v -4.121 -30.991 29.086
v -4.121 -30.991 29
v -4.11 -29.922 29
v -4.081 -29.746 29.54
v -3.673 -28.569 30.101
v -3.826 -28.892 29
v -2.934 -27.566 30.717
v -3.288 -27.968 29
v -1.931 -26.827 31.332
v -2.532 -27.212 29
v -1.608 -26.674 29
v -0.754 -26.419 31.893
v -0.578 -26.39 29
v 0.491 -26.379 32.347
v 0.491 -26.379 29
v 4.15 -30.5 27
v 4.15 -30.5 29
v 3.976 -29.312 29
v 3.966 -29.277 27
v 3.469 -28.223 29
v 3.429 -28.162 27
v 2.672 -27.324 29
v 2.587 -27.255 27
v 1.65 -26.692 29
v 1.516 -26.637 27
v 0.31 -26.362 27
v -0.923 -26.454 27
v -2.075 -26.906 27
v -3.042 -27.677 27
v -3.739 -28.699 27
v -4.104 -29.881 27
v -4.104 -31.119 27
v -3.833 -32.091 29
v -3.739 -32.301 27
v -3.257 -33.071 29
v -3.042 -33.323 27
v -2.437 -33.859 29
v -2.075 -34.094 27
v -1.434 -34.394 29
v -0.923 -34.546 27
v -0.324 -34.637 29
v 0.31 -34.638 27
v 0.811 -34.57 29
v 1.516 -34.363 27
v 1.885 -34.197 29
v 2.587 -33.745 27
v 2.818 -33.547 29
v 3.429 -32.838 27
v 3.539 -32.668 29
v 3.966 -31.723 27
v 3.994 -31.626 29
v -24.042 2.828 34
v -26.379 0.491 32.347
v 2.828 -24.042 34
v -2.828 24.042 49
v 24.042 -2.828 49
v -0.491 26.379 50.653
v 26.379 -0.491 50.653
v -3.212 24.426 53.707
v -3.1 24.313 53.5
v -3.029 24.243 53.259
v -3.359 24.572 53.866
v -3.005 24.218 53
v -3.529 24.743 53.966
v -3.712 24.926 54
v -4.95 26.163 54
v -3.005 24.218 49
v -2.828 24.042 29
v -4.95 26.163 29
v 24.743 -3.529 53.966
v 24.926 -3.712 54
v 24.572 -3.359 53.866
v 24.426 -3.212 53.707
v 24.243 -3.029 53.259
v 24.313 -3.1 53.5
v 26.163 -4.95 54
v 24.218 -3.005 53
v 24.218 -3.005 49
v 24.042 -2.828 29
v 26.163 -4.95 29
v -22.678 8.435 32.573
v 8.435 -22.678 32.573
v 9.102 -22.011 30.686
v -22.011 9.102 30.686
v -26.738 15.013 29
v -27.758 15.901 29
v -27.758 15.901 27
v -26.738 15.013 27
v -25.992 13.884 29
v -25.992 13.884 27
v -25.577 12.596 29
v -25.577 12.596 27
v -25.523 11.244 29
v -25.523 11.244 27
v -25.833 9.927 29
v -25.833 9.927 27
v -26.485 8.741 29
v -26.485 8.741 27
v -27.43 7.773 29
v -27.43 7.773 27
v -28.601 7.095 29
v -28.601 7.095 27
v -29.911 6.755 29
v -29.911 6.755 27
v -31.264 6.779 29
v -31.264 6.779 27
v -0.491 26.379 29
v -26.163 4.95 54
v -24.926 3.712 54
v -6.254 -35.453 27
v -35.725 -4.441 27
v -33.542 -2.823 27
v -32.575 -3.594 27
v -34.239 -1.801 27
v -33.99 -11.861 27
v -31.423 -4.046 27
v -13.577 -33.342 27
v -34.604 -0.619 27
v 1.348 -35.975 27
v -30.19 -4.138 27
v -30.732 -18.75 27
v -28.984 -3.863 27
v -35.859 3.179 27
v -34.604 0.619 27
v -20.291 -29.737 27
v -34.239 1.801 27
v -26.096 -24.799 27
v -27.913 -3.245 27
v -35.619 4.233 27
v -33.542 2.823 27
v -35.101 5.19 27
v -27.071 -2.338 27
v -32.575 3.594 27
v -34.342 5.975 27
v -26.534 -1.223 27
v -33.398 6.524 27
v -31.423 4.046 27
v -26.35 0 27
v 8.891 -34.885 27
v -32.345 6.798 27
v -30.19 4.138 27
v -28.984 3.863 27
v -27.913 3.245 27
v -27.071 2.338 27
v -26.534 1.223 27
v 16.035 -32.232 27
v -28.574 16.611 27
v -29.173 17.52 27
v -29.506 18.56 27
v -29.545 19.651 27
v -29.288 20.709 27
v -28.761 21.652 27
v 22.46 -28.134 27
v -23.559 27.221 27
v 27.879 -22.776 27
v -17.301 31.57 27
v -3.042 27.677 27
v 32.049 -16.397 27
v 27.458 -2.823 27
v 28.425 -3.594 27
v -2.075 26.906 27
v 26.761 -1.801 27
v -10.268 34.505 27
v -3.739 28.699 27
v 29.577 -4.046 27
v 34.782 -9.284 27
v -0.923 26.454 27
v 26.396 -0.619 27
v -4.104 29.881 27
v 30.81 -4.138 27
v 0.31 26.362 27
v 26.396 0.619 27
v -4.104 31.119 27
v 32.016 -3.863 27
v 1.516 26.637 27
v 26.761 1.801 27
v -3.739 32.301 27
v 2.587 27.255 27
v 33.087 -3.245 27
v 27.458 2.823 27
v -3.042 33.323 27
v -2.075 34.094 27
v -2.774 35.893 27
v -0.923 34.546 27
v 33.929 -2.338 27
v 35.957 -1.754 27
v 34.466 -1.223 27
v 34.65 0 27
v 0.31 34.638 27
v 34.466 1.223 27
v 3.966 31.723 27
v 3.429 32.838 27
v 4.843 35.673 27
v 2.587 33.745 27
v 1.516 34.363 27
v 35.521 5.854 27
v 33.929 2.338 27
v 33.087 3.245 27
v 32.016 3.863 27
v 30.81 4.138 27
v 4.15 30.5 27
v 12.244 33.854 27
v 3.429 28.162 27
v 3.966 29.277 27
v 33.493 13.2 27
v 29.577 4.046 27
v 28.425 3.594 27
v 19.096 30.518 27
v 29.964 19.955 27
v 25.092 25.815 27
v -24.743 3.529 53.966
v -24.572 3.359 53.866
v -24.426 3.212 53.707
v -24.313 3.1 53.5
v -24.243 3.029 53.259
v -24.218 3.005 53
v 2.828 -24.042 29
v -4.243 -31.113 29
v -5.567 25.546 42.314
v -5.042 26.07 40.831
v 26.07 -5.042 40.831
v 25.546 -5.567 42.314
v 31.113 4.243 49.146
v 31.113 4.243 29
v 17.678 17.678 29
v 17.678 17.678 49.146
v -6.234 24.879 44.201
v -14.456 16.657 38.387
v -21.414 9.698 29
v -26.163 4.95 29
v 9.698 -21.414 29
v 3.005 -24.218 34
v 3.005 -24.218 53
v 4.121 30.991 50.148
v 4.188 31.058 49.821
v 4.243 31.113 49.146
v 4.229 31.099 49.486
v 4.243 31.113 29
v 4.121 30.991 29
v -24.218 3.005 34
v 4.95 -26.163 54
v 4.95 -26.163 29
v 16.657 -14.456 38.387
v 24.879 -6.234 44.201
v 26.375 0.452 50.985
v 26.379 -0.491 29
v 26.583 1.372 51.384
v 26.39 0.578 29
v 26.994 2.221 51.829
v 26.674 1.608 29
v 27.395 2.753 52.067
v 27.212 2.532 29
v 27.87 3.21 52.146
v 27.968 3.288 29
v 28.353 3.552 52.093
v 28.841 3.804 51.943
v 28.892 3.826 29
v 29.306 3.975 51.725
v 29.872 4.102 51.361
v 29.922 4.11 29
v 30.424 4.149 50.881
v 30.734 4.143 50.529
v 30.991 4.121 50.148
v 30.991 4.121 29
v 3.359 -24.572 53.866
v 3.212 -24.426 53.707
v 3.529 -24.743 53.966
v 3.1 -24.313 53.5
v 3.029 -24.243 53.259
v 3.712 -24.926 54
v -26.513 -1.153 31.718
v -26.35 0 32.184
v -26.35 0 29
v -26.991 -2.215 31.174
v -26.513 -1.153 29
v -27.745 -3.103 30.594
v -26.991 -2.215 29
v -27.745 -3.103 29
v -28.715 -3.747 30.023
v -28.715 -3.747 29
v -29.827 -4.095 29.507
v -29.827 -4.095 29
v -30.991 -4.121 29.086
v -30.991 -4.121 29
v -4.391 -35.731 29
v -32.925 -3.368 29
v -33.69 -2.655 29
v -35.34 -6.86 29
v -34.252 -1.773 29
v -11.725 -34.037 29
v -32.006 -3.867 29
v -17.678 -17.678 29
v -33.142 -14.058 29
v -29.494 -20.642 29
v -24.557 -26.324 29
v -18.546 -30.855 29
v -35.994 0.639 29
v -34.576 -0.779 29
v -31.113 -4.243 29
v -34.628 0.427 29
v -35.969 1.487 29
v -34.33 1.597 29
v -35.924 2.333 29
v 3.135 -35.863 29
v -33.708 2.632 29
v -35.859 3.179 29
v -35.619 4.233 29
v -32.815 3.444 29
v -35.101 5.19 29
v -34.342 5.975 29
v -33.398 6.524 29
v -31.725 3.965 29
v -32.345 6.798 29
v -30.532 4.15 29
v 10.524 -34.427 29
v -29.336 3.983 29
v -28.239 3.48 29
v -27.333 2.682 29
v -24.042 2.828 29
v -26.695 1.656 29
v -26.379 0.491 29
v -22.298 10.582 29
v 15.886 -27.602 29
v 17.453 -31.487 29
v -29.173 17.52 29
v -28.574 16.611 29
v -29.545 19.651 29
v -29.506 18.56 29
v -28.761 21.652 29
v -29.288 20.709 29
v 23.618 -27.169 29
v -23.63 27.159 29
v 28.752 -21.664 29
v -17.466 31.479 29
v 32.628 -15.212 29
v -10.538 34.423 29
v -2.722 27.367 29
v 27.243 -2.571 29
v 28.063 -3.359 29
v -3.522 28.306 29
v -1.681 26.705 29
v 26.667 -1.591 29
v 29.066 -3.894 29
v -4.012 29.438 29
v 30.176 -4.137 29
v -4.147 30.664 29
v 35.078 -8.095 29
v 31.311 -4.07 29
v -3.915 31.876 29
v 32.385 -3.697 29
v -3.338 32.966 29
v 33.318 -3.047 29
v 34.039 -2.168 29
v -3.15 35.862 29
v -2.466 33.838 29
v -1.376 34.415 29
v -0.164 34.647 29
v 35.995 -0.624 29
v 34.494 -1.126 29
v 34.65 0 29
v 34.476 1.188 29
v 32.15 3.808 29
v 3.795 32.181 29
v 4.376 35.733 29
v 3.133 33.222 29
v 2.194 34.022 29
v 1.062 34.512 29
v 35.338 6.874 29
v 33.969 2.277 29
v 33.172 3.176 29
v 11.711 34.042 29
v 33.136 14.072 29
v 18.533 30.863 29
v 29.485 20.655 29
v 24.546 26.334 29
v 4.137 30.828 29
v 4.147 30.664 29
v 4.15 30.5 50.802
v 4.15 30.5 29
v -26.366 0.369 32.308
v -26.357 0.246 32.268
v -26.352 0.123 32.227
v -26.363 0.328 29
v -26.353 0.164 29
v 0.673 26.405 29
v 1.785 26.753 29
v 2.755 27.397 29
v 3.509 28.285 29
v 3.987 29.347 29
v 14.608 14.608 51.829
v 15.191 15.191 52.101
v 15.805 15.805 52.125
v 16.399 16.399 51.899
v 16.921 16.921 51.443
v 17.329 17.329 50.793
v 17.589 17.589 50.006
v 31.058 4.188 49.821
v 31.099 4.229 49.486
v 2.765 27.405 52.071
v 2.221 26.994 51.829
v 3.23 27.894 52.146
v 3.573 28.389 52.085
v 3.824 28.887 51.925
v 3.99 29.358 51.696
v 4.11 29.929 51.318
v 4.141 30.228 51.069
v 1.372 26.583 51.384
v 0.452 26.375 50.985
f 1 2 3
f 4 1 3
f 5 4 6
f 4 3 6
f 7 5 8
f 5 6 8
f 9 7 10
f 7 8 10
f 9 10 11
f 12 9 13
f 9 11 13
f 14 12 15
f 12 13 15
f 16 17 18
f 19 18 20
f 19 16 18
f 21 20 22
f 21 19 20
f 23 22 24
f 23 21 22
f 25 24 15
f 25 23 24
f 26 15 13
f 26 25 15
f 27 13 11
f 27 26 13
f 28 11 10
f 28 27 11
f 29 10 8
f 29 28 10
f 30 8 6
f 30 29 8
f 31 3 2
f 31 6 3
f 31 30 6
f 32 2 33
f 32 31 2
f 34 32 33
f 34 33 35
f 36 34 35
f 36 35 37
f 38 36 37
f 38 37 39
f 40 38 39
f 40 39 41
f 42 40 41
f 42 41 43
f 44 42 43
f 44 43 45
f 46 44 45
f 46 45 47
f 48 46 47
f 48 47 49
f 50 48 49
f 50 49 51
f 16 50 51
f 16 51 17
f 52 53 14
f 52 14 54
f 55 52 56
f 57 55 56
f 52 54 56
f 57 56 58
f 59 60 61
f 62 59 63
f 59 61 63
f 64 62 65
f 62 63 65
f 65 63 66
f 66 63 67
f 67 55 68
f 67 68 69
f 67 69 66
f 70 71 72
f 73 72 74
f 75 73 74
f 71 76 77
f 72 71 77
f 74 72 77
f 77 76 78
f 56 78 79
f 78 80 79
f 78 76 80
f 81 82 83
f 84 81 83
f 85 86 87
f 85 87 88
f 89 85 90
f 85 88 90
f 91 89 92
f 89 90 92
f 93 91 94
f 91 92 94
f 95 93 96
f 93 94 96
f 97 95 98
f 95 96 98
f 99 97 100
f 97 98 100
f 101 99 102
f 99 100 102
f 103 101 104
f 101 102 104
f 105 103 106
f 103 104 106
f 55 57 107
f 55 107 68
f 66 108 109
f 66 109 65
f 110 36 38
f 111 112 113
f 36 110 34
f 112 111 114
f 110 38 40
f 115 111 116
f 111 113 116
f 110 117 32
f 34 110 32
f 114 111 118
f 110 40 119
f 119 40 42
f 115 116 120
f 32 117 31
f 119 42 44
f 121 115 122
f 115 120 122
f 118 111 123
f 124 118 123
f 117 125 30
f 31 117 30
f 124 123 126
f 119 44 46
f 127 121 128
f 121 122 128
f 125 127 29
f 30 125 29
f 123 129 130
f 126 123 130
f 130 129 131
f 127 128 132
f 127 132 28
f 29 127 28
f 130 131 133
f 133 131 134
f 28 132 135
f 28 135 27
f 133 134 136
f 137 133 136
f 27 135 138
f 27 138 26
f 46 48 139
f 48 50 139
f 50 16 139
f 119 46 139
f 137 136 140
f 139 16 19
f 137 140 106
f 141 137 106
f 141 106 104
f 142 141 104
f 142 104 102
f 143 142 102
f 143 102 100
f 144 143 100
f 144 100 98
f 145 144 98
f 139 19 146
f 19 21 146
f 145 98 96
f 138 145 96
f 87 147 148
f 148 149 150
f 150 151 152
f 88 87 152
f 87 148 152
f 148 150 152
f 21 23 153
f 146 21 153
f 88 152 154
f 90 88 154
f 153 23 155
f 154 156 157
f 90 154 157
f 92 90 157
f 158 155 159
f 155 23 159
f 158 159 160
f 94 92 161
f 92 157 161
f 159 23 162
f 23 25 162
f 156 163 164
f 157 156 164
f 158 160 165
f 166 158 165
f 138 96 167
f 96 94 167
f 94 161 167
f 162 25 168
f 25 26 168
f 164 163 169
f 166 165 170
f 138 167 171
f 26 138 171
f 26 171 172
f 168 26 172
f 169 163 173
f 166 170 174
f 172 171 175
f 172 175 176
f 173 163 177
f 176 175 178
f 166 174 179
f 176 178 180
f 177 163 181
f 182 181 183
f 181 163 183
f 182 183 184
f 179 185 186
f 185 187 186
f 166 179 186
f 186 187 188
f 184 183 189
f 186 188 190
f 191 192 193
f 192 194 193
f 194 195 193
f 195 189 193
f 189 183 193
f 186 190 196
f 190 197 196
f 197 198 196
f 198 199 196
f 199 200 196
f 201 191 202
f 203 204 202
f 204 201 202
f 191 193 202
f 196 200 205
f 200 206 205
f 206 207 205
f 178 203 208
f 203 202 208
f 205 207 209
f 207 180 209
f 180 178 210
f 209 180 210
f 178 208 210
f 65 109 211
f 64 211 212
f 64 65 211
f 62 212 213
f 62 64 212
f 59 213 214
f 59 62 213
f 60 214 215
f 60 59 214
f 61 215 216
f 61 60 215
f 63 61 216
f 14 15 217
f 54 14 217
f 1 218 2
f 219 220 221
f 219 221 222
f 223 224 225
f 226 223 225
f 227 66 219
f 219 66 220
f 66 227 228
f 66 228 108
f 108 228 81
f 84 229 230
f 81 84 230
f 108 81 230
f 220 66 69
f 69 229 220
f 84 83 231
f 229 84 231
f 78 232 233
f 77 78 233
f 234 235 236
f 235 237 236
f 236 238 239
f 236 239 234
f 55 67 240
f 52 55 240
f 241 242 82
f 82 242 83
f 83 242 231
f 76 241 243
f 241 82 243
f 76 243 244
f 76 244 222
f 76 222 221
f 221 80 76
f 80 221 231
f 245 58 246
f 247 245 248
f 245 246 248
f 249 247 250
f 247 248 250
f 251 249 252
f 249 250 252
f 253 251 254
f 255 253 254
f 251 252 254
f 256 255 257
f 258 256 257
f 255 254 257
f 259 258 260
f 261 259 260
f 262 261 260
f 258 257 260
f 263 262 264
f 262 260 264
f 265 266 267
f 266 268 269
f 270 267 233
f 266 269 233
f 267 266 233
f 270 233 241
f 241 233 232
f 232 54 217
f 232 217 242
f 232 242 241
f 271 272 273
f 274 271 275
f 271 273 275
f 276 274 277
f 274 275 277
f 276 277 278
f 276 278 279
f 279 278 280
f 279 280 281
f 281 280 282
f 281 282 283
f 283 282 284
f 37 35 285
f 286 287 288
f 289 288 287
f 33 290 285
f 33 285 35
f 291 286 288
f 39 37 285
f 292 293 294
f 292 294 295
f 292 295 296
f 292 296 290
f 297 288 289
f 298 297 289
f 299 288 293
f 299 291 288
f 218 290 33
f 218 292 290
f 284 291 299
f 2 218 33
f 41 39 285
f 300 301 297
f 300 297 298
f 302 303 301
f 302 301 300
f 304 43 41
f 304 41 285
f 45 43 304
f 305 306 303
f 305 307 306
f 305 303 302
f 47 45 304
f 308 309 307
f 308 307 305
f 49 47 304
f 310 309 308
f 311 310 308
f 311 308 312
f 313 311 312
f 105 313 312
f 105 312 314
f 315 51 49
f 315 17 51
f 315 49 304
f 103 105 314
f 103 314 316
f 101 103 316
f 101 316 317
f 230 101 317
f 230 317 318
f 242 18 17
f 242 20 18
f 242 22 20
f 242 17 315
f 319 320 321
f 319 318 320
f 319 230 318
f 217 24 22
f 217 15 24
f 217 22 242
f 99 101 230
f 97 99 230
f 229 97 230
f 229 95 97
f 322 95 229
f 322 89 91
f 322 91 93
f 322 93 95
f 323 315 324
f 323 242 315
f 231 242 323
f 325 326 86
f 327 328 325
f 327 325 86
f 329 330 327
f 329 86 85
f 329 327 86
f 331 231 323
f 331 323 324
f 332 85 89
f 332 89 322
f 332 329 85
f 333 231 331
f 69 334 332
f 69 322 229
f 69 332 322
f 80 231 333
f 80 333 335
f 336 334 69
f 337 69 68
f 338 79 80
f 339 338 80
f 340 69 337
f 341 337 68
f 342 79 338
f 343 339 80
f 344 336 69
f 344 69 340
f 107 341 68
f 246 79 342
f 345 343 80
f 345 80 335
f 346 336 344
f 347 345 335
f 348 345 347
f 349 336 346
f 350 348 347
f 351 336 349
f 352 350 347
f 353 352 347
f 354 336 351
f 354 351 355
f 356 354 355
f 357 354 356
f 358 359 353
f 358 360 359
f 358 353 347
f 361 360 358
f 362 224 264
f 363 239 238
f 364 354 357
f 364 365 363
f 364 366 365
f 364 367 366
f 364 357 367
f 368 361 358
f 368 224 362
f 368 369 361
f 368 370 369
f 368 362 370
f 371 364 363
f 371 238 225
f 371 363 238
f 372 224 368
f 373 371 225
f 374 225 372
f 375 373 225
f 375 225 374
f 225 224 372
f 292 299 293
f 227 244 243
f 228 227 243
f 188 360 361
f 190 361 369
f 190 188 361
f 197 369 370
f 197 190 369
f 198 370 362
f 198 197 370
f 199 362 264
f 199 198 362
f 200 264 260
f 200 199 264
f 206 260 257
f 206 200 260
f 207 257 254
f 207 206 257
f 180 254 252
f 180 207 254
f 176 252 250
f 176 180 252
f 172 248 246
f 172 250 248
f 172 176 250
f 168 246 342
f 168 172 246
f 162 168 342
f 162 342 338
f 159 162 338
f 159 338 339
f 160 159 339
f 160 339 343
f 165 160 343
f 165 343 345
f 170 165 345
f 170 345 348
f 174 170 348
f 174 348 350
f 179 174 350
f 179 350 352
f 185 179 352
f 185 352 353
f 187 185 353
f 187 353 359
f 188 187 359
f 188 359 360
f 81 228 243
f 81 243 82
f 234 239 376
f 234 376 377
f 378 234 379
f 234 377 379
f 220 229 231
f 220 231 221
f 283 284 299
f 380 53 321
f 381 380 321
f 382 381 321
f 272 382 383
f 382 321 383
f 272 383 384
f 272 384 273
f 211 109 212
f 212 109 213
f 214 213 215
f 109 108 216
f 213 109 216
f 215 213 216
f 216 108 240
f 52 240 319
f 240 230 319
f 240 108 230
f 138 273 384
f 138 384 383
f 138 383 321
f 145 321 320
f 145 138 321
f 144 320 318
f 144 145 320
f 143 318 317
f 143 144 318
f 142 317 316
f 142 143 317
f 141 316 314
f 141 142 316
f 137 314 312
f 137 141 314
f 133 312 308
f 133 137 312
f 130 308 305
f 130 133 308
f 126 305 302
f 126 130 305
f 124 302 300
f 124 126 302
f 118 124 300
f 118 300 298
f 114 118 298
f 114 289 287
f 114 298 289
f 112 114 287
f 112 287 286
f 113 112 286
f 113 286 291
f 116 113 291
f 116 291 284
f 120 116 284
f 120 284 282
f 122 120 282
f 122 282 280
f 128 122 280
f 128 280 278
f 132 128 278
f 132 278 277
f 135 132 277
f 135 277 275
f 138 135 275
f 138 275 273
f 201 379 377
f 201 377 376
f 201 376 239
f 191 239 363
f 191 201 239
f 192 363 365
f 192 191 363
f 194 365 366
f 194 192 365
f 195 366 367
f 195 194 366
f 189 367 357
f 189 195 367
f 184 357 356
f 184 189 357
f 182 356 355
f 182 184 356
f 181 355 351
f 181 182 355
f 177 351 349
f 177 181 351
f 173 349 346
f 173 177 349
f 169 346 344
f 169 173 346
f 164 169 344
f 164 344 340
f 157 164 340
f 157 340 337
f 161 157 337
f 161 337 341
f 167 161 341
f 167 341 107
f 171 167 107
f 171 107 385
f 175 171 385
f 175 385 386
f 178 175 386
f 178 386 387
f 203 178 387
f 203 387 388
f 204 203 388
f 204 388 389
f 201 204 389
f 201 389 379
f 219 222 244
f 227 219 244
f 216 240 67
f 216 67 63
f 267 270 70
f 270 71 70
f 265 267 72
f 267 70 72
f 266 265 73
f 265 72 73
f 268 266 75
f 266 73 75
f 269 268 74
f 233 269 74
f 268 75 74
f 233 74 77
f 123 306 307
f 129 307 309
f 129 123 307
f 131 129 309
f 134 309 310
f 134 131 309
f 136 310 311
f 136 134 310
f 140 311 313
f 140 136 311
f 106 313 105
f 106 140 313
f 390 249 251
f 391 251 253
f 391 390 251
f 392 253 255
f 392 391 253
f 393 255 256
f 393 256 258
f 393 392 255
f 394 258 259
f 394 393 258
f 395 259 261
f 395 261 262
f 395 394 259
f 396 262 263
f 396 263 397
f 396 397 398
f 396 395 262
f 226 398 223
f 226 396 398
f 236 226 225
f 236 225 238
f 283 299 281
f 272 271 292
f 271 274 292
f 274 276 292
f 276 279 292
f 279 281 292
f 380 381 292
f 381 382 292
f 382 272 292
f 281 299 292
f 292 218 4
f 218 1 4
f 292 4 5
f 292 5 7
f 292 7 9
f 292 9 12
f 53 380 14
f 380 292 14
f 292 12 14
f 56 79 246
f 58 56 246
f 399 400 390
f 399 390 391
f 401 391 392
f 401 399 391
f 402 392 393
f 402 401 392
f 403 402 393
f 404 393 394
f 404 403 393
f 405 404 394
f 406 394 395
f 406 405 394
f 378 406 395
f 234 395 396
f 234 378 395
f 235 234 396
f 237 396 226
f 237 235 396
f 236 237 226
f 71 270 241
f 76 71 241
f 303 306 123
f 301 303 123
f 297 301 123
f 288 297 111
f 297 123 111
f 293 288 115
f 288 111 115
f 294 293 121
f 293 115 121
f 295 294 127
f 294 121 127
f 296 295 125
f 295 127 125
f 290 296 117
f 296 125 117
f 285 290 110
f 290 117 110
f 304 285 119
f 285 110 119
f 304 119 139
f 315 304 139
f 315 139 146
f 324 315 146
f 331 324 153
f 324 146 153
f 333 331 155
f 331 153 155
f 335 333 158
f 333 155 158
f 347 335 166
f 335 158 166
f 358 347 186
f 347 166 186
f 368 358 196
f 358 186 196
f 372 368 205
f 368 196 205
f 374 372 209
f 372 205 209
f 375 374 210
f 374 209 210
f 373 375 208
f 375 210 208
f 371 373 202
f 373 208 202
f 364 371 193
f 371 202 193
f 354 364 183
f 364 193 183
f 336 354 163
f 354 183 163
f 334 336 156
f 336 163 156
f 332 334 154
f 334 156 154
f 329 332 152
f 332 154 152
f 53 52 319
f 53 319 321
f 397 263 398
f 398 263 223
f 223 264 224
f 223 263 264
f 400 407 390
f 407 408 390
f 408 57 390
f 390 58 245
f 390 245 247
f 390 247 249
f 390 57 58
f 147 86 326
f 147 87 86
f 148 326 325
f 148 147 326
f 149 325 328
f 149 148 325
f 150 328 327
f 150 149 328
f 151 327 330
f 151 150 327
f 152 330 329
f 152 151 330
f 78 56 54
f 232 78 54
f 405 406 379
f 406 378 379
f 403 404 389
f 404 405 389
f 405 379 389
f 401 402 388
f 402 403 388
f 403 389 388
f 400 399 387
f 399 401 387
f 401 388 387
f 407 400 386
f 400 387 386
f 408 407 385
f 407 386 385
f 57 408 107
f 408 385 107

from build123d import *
from build123d.topology import SkipClean

# Parameters (mm, degrees)
SKETCH_1_R               = 36
SKETCH_1_R_2             = 4.15
EXTRUDE_1_DEPTH          = 2
SKETCH_2_W               = 45
SKETCH_2_H               = 45
EXTRUDE_2_DEPTH          = 25
SKETCH_3_R               = 36
SKETCH_3_R_2             = 4.15
EXTRUDE_3_DEPTH          = 2
EXTRUDE_4_DEPTH          = 25
CUT_EXTRUDE_1_DEPTH      = 50
EXTRUDE_6_DEPTH          = 25
CUT_EXTRUDE_3_DEPTH      = 38.25
CUT_EXTRUDE_3_DEPTH_BACK = 0.25
CUT_EXTRUDE_4_DEPTH      = 50
CUT_EXTRUDE_4_DEPTH_BACK = 4
SKETCH_20_W              = 45
SKETCH_20_H              = 45
EXTRUDE_7_DEPTH          = 13
FILLET_1_R               = 3
FILLET_2_R               = 1
SKETCH_22_R              = 36
CUT_EXTRUDE_6_DEPTH      = 40
SKETCH_24_R              = 5
CUT_EXTRUDE_7_DEPTH      = 2
FILLET_3_R               = 4


with BuildPart() as part:
    # 草图1 → 凸台-拉伸1 (new body)
    with BuildSketch(Plane.XY):
        Circle(SKETCH_1_R)
        with Locations((30.5, 0)):
            Circle(SKETCH_1_R_2, mode=Mode.SUBTRACT)
        with Locations((0, -30.5)):
            Circle(SKETCH_1_R_2, mode=Mode.SUBTRACT)
        with Locations((-30.5, 0)):
            Circle(SKETCH_1_R_2, mode=Mode.SUBTRACT)
        with Locations((0, 30.5)):
            Circle(SKETCH_1_R_2, mode=Mode.SUBTRACT)
    extrude(amount=EXTRUDE_1_DEPTH)

    # 草图2 → 凸台-拉伸2 (add)
    with BuildSketch(Plane.XY.offset(2)):
        Rectangle(SKETCH_2_W, SKETCH_2_H)
    extrude(amount=EXTRUDE_2_DEPTH)

    # 草图3 → 凸台-拉伸3 (add)
    with BuildSketch(Plane.XY.offset(27)):
        Circle(SKETCH_3_R)
        with Locations((0, 30.5)):
            Circle(SKETCH_3_R_2, mode=Mode.SUBTRACT)
        with Locations((0, -30.5)):
            Circle(SKETCH_3_R_2, mode=Mode.SUBTRACT)
        with Locations((-30.5, 0)):
            Circle(SKETCH_3_R_2, mode=Mode.SUBTRACT)
        with Locations((30.5, 0)):
            Circle(SKETCH_3_R_2, mode=Mode.SUBTRACT)
    extrude(amount=EXTRUDE_3_DEPTH)

    # 草图8 → 凸台-拉伸4 (add)
    with SkipClean():  # the faces are left unmerged after this step: merging them gives an invalid solid
        with BuildSketch(Plane.XY.offset(29)):
            with BuildLine():
                Line((-31.112698372, -4.242640687), (-4.242640687, -31.112698372))
                Line((-4.242640687, -31.112698372), (-4.120861375, -30.990919061))
                ThreePointArc((-4.120861375, -30.990919061), (-2.934493142, -27.565506858), (0.490919061, -26.379138625))
                Line((0.490919061, -26.379138625), (26.379138625, -0.490919061))
                ThreePointArc((26.379138625, -0.490919061), (27.565506858, 2.934493142), (30.990919061, 4.120861375))
                Line((30.990919061, 4.120861375), (31.112698372, 4.242640687))
                Line((31.112698372, 4.242640687), (4.242640687, 31.112698372))
                Line((4.242640687, 31.112698372), (4.120861375, 30.990919061))
                ThreePointArc((4.120861375, 30.990919061), (2.934493142, 27.565506858), (-0.490919061, 26.379138625))
                Line((-0.490919061, 26.379138625), (-26.379138625, 0.490919061))
                ThreePointArc((-26.379138625, 0.490919061), (-27.565506858, -2.934493142), (-30.990919061, -4.120861375))
                Line((-30.990919061, -4.120861375), (-31.112698372, -4.242640687))
            make_face()
        extrude(amount=EXTRUDE_4_DEPTH)

    # 草图12 → 切除-拉伸1 (cut)
    with BuildSketch(Plane(origin=(13.435028843, -13.435028843, 0), x_dir=(0, 0, -1), z_dir=(0.7071067811865477, -0.7071067811865474, 0))):
        Polygon((-54, 25), (-54, -25), (-29, -25), align=None)
    extrude(amount=-CUT_EXTRUDE_1_DEPTH, mode=Mode.SUBTRACT)

    # 草图16 → 凸台-拉伸6 (add)
    with SkipClean():  # the faces are left unmerged after this step: merging them gives an invalid solid
        with BuildSketch(Plane.XY.offset(29)):
            Polygon((-24.04163056, 2.828427125), (-2.828427125, 24.04163056), (-4.949747468, 26.162950904), (-26.162950904, 4.949747468), align=None)
            Polygon((24.04163056, -2.828427125), (2.828427125, -24.04163056), (4.949747468, -26.162950904), (26.162950904, -4.949747468), align=None)
        extrude(amount=EXTRUDE_6_DEPTH)

    # 草图17 → 切除-拉伸3 (cut, two sides: drawn at the far end of the back side and taken through both)
    with SkipClean():  # the faces are left unmerged after this step: merging them gives an invalid solid
        with BuildSketch(Plane(origin=(-13.435028843, 13.435028843, 0), x_dir=(0, 0, -1), z_dir=(0.7071067811865477, -0.7071067811865474, 0)).offset(-CUT_EXTRUDE_3_DEPTH_BACK)):
            Polygon((-49, 15), (-34, -15), (-54, -15), (-54, 15), align=None)
        extrude(amount=CUT_EXTRUDE_3_DEPTH + CUT_EXTRUDE_3_DEPTH_BACK, mode=Mode.SUBTRACT)

    # 草图18 → 切除-拉伸4 (cut, two sides: drawn at the far end of the back side and taken through both)
    with SkipClean():  # the faces are left unmerged after this step: merging them gives an invalid solid
        with BuildSketch(Plane(origin=(-13.611805538, 13.611805538, 0), x_dir=(0, 0, -1), z_dir=(0.7071067811865477, -0.7071067811865474, 0)).offset(-CUT_EXTRUDE_4_DEPTH_BACK)):
            Polygon((-44.201018115, 13.183932796), (-32.573464632, -10.07117417), (-29, -8.284441854), (-40.83096799, 14.868957859), align=None)
        extrude(amount=CUT_EXTRUDE_4_DEPTH + CUT_EXTRUDE_4_DEPTH_BACK, mode=Mode.SUBTRACT)

    # 草图20 → 凸台-拉伸7 (add)
    with SkipClean():  # the faces are left unmerged after this step: merging them gives an invalid solid
        with BuildSketch(Plane(origin=(0, 0, 0), x_dir=(-1, 0, 0), z_dir=(0, 0, -1))):
            Rectangle(SKETCH_20_W, SKETCH_20_H)
        extrude(amount=EXTRUDE_7_DEPTH)

    # 圆角1
    fillet_1_edges = [part.edges().sort_by_distance(p)[0] for p in [
        (17.67766953, 17.67766953, 54),
    ]]
    fillet(fillet_1_edges, radius=FILLET_1_R)

    # 圆角2
    fillet_2_edges = [part.edges().sort_by_distance(p)[0] for p in [
        (13.611805538, -13.611805538, 54),
        (-13.611805538, 13.611805538, 54),
    ]]
    fillet(fillet_2_edges, radius=FILLET_2_R)

    # 草图22 → 切除-拉伸6 (cut)
    with SkipClean():  # the faces are left unmerged after this step: merging them gives an invalid solid
        with BuildSketch(Plane(origin=(0, 0, -13), x_dir=(-1, 0, 0), z_dir=(0, 0, -1))):
            Circle(SKETCH_22_R)
        extrude(amount=-CUT_EXTRUDE_6_DEPTH, mode=Mode.SUBTRACT)

    # 草图24 → 切除-拉伸7 (cut)
    with SkipClean():  # the faces are left unmerged after this step: merging them gives an invalid solid
        with BuildSketch(Plane(origin=(0, 0, 27), x_dir=(-1, 0, 0), z_dir=(0, 0, -1))):
            with Locations((30.5, 11.72)):
                Circle(SKETCH_24_R)
        extrude(amount=-CUT_EXTRUDE_7_DEPTH, mode=Mode.SUBTRACT)

    # 圆角3
    fillet_3_edges = [part.edges().sort_by_distance(p)[0] for p in [
        (-34.808921563, 9.183625626, 28),
        (-32.001676968, 16.489168301, 28),
    ]]
    fillet(fillet_3_edges, radius=FILLET_3_R)


solid = part.part
